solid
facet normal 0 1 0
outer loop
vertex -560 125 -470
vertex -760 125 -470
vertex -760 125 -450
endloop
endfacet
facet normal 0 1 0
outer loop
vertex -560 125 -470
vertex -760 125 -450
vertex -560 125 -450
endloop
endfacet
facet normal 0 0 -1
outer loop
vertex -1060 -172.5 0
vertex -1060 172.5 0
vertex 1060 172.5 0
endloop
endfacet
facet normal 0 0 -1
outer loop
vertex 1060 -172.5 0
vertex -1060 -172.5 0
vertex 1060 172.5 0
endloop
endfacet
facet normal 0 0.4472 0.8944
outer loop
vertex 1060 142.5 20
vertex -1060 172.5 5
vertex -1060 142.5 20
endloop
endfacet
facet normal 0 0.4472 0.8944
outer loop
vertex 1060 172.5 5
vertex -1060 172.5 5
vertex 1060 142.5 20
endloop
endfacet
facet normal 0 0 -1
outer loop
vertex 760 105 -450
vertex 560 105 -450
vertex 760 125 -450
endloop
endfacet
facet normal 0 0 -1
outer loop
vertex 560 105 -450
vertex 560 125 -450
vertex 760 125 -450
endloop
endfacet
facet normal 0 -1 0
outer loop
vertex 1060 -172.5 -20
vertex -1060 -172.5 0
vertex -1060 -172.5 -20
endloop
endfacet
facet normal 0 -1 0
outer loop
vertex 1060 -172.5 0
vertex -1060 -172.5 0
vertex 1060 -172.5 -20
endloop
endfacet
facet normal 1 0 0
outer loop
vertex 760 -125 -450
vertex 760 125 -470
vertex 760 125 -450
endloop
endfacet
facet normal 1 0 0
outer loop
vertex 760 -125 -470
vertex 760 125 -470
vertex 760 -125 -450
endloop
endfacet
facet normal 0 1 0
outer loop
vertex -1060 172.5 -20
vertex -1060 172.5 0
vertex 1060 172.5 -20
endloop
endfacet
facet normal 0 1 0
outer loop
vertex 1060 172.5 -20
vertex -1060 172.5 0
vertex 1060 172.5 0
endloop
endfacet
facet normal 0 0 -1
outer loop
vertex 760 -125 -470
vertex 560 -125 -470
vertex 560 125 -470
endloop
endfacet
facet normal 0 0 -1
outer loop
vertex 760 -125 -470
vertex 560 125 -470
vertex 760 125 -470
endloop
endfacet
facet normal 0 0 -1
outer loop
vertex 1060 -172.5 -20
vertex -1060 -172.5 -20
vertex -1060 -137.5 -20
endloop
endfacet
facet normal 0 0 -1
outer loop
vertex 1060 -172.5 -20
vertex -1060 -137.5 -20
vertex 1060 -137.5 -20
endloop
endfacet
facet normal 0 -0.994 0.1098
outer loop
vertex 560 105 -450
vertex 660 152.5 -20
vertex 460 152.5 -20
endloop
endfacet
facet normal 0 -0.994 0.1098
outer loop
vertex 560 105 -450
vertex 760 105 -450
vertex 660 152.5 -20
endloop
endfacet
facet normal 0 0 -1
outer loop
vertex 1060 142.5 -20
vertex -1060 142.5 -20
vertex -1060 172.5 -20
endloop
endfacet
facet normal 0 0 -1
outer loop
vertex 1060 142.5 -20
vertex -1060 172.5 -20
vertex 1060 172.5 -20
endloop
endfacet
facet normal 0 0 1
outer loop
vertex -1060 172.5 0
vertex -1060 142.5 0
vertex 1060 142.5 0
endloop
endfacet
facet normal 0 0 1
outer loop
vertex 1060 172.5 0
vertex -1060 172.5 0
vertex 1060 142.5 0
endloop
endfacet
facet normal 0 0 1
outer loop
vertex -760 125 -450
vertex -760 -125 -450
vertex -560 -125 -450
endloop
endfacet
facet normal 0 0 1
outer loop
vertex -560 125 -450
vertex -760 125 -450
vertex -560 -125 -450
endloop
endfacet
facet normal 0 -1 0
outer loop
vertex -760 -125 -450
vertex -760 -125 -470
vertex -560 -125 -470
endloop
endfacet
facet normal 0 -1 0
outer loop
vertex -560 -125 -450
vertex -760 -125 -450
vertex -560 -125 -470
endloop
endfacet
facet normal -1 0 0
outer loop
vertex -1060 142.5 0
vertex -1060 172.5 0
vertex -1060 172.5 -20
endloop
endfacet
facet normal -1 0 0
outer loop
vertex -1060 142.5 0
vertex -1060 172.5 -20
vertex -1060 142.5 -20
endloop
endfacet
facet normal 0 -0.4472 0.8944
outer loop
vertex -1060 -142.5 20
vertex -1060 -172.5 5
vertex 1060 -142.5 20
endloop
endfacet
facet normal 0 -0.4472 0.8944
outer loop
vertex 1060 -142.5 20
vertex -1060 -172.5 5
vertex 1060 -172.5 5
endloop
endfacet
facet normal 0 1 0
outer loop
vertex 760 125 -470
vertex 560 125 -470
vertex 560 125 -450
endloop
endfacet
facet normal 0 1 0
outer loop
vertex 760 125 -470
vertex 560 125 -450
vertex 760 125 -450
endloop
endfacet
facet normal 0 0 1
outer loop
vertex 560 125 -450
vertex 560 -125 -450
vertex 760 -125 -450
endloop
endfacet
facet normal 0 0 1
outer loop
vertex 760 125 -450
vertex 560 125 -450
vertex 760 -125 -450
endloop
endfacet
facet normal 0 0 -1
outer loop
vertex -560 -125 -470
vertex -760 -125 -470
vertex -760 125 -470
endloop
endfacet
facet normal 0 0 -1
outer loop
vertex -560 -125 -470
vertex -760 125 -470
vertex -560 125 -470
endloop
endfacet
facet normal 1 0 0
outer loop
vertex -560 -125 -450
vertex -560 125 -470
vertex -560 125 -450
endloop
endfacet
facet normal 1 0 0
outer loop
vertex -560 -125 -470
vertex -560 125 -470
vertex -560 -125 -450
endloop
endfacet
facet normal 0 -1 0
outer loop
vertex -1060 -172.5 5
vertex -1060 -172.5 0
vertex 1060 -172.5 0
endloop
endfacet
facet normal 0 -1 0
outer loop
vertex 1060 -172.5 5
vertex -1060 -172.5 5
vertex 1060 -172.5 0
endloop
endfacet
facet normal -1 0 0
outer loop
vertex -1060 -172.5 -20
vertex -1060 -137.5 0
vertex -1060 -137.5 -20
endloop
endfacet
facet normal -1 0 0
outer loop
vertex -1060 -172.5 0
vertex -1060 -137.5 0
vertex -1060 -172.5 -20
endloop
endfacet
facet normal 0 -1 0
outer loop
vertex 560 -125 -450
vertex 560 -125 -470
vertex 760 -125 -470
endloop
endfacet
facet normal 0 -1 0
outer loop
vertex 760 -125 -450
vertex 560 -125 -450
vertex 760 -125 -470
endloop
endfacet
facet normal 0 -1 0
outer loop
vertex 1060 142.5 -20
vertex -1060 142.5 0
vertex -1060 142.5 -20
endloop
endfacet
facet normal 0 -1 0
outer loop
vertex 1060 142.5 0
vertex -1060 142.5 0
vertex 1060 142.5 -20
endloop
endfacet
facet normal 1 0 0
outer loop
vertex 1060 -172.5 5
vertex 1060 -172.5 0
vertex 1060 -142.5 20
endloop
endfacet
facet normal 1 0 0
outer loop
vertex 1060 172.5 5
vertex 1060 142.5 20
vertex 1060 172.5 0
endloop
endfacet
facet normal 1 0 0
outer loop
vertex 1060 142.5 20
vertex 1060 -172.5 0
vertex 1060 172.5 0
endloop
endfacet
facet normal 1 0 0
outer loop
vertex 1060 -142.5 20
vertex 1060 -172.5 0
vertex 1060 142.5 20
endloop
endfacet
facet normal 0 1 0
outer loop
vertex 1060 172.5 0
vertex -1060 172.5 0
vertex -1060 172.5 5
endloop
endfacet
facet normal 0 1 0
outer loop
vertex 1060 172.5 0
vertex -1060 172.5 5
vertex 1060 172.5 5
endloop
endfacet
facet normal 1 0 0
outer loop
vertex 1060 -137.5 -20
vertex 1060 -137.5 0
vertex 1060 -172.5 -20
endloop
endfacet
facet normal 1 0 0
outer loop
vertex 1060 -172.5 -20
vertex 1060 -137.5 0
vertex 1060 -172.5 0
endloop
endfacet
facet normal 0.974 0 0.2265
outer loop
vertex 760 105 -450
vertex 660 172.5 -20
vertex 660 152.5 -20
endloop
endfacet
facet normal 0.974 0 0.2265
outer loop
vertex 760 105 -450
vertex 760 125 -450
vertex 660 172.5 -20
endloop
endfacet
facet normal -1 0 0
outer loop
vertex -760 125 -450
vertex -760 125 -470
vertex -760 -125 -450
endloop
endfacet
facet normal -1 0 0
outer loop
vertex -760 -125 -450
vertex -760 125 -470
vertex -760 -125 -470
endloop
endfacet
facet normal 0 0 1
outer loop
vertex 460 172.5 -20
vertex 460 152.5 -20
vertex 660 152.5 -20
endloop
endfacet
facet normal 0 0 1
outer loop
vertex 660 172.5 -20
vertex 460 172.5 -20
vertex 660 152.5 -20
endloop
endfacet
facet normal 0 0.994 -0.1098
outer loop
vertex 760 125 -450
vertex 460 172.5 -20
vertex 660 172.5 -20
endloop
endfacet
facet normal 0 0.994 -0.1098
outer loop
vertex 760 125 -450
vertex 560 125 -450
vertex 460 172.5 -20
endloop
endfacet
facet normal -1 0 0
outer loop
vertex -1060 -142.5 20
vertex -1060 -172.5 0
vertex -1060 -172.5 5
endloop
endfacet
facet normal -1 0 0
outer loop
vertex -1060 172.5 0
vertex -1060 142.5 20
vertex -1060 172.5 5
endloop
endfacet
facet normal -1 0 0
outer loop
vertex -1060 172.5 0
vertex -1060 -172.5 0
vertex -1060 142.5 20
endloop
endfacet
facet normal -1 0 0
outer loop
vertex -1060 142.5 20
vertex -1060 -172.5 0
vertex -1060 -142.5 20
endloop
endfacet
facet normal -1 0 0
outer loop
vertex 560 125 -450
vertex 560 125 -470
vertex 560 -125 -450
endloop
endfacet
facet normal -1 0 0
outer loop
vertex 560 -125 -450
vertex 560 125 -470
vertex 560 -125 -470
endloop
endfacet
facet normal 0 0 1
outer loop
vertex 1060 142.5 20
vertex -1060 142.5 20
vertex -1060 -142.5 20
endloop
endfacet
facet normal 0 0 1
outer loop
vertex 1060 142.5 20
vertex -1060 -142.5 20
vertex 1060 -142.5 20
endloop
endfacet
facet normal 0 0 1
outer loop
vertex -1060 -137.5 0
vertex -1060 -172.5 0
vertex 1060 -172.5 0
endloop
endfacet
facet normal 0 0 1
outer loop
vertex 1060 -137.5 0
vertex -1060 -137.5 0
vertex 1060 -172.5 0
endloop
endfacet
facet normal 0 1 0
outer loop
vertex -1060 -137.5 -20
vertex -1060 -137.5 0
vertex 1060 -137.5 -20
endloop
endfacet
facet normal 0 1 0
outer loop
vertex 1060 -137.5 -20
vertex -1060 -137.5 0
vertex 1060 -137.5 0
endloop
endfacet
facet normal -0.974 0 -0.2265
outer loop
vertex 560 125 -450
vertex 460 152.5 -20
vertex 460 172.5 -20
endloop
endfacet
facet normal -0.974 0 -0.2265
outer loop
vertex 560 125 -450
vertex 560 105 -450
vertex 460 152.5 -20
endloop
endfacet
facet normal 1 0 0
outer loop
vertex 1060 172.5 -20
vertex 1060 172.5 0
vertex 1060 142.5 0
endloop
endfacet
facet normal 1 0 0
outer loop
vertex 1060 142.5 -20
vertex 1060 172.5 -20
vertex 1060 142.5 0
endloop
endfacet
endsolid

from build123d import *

# Parameters (mm, degrees)
F0_W      = 2120
F0_H      = 345
F1_DEPTH  = 20
F2_SIZE2  = 15
F2_SIZE   = 30
F3_W      = 2120
F3_H      = 35
F4_DEPTH  = 20
F3_H_2    = 30
F9_W      = 200
F9_H      = 250
F10_DEPTH = 20
F8_W      = 200
F8_H      = 20
F12_W     = 200
F12_H     = 20


with BuildPart() as f1:
    # F0 (on Top) → F1 (new body)
    with BuildSketch(Plane.XY):
        Rectangle(F0_W, F0_H)
    extrude(amount=F1_DEPTH)

    # F2
    f2_edges = [f1.edges().sort_by_distance(p)[0] for p in [
        (0, -172.5, 20),
        (0, 172.5, 20),
    ]]
    f2_side = f1.faces().sort_by_distance((0, 0, 20))[0]
    chamfer(f2_edges, length=F2_SIZE, length2=F2_SIZE2, reference=f2_side)


with BuildPart() as f4:
    # F3 (on face) → F4 (new body)
    with BuildSketch(Plane(origin=(0, 0, 0), x_dir=(1, 0, 0), z_dir=(0, 0, -1))):
        with Locations((0, 155)):
            Rectangle(F3_W, F3_H)
    extrude(amount=F4_DEPTH)


with BuildPart() as f4b:
    # F3 (on face) → F4, piece 2 (new body)
    with BuildSketch(Plane(origin=(0, 0, 0), x_dir=(1, 0, 0), z_dir=(0, 0, -1))):
        with Locations((0, -157.5)):
            Rectangle(F3_W, F3_H_2)
    extrude(amount=F4_DEPTH)


with BuildPart() as f10:
    # F9 (on offset) → F10 (new body)
    with BuildSketch(Plane(origin=(0, 0, -470), x_dir=(1, 0, 0), z_dir=(0, 0, -1))):
        with Locations((660, 0)):
            Rectangle(F9_W, F9_H)
    extrude(amount=-F10_DEPTH)


with BuildPart() as f10b:
    # F9 (on offset) → F10, piece 2 (new body)
    with BuildSketch(Plane(origin=(0, 0, -470), x_dir=(1, 0, 0), z_dir=(0, 0, -1))):
        with Locations((-660, 0)):
            Rectangle(F9_W, F9_H)
    extrude(amount=-F10_DEPTH)


with BuildPart() as f13:
    # F8 (on face) → F13 section 0
    with BuildSketch(Plane(origin=(0, 0, -20), x_dir=(1, 0, 0), z_dir=(0, 0, -1))):
        with Locations((560, -162.5)):
            Rectangle(F8_W, F8_H)
    # F12 (on face) → F13 section 1
    with BuildSketch(Plane.XY.offset(-450)):
        with Locations((660, 115)):
            Rectangle(F12_W, F12_H)
    loft()


solid = Compound([f1.part, f4.part, f4b.part, f10.part, f10b.part, f13.part])
